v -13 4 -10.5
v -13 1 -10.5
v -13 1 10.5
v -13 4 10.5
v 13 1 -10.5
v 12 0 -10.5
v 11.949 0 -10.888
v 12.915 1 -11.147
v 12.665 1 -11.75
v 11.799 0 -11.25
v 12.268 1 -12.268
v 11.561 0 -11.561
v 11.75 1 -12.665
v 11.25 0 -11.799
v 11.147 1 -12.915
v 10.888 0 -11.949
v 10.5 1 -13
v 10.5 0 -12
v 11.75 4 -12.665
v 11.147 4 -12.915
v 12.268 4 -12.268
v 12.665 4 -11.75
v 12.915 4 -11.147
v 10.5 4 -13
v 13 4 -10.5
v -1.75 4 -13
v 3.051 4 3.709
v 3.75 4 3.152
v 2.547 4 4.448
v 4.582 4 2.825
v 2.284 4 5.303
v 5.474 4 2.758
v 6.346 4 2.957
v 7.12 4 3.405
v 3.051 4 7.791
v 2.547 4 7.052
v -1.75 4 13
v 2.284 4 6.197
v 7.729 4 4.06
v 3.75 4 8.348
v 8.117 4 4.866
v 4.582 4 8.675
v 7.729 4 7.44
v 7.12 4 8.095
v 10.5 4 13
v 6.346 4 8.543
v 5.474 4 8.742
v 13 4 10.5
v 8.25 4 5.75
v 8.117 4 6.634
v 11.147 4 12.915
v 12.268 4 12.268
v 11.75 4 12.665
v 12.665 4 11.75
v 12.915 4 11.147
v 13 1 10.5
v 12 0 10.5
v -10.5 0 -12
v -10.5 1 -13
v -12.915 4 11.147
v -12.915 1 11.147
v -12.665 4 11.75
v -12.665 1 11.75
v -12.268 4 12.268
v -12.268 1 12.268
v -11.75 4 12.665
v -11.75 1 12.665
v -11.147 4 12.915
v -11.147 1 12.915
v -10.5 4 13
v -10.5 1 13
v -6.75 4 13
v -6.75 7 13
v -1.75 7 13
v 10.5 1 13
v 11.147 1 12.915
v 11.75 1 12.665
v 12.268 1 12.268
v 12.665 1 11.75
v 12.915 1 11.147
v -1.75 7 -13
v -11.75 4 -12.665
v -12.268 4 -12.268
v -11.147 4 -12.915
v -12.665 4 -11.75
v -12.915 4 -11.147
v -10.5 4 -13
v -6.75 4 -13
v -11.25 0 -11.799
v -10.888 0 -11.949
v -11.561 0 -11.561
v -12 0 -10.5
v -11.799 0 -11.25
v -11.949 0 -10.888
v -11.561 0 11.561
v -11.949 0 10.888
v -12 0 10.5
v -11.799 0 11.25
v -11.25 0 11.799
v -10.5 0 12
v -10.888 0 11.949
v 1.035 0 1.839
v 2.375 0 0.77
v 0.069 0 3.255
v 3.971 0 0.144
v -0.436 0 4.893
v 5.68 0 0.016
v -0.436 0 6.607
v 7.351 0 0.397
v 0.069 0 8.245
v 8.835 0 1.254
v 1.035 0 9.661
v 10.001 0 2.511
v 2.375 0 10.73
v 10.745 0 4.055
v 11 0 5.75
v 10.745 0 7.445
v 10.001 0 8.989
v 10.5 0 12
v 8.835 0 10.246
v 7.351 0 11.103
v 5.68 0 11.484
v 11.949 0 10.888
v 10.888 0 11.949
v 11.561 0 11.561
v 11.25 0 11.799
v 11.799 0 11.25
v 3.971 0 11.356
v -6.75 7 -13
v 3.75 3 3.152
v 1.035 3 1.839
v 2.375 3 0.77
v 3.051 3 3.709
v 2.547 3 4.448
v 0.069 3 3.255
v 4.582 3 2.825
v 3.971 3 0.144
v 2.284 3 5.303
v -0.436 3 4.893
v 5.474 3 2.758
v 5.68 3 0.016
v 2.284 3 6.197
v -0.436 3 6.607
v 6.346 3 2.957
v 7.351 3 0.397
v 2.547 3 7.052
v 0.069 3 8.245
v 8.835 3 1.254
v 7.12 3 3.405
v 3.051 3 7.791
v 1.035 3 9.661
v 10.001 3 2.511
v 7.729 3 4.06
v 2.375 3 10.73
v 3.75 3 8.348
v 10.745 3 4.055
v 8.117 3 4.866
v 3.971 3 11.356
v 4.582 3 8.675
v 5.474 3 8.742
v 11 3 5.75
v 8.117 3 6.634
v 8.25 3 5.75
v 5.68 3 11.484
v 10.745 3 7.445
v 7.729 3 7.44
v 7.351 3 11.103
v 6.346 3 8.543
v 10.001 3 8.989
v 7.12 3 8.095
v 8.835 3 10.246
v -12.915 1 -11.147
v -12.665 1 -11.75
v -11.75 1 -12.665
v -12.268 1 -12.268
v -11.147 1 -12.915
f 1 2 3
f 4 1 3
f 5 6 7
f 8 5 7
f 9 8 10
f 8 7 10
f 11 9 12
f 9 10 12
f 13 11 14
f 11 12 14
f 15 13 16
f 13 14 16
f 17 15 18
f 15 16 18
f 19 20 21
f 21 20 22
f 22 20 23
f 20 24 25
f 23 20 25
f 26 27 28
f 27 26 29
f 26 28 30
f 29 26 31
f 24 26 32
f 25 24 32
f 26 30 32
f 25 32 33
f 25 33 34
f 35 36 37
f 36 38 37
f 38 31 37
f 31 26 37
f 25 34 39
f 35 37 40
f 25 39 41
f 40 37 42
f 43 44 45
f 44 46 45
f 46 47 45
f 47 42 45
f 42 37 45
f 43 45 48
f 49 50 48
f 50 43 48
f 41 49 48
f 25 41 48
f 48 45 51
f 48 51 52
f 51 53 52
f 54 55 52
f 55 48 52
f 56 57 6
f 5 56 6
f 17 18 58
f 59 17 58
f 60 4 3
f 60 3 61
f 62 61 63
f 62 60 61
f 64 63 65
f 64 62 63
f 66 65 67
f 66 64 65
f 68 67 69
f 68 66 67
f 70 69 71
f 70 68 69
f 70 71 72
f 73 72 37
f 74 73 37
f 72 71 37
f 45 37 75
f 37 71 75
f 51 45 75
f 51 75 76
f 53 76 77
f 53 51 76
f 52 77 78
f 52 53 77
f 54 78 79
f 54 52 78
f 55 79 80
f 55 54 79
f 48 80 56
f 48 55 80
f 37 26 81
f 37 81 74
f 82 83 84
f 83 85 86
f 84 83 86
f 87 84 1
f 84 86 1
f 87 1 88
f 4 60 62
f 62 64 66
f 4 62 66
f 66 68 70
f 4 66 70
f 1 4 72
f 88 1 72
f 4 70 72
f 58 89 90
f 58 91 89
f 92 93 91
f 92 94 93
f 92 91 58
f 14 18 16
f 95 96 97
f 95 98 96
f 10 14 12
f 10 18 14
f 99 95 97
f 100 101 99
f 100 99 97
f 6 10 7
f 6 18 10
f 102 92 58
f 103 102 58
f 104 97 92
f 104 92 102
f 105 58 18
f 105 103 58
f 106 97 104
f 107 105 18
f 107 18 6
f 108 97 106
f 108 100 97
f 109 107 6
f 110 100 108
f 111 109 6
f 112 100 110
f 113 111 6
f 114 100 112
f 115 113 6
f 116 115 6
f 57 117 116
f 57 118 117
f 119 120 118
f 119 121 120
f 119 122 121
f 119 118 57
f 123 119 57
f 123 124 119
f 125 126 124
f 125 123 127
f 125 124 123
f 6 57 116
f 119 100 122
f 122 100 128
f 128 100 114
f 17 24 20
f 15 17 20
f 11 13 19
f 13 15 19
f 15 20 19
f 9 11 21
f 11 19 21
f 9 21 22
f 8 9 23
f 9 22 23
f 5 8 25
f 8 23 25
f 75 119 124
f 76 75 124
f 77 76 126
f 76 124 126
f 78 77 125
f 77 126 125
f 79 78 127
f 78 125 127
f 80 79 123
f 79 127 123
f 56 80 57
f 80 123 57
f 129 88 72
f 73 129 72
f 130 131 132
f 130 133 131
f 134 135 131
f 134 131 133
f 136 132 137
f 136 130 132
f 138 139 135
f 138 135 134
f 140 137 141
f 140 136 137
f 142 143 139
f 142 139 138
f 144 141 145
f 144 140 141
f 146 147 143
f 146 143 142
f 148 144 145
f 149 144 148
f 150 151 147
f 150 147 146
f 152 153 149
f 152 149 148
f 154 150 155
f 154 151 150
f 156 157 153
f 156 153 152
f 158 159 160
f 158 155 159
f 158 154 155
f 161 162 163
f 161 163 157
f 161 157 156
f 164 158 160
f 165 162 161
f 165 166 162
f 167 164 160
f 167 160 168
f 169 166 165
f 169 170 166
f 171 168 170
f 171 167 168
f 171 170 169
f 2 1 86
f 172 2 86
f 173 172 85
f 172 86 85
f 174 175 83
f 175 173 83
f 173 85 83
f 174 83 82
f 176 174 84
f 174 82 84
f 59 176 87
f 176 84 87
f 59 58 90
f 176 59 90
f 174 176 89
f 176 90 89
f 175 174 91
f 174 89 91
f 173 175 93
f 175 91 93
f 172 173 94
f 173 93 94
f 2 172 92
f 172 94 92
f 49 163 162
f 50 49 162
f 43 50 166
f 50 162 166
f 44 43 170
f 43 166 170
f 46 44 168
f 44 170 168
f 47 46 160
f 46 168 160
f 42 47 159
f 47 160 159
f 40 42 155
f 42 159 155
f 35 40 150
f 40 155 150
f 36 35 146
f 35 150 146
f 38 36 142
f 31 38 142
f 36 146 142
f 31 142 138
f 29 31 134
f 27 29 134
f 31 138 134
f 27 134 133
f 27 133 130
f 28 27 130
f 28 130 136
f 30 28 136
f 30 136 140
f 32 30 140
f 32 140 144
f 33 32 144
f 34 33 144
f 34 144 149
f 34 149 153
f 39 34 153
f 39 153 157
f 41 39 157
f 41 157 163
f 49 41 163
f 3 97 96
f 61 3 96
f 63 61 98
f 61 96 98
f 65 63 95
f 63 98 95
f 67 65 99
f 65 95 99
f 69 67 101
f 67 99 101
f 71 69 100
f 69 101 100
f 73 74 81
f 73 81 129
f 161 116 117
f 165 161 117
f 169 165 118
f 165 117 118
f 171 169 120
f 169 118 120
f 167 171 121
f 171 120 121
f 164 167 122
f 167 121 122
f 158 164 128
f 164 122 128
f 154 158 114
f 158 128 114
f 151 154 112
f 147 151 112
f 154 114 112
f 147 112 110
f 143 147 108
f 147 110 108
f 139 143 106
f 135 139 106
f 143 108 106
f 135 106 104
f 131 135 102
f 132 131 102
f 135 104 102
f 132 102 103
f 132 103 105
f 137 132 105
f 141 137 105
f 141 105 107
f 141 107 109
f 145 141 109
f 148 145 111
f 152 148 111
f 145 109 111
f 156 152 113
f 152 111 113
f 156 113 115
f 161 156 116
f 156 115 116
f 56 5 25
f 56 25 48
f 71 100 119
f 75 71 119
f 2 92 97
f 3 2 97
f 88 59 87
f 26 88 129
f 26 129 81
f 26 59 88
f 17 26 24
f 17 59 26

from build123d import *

# Parameters (mm, degrees)
F0_W     = 26
F0_H     = 26
F1_DEPTH = 4
F2_W     = 5
F2_H     = 26
F3_DEPTH = 3
F4_R     = 2.5
F5_R     = 3
F6_DEPTH = 25
F7_R     = 5.75
F8_DEPTH = 3
F9_SIZE  = 1


with BuildPart() as f1:
    # F0 (on Front) → F1 (new body)
    with BuildSketch(Plane.XZ):
        Rectangle(F0_W, F0_H)
    extrude(amount=-F1_DEPTH)

    # F2 (on face) → F3 (join)
    with BuildSketch(Plane(origin=(0, 4, 0), x_dir=(-1, 0, 0), z_dir=(0, 1, 0))):
        with Locations((4.25, 0)):
            Rectangle(F2_W, F2_H)
    extrude(amount=F3_DEPTH)

    # F4
    f4_edges = [f1.edges().sort_by_distance(p)[0] for p in [
        (-13, 2, 13),
        (-13, 2, -13),
        (13, 2, 13),
        (13, 2, -13),
    ]]
    fillet(f4_edges, radius=F4_R)

    # F5 (on face) → F6 (cut)
    with BuildSketch(Plane.XZ):
        with Locations((5.25, 5.75)):
            Circle(F5_R)
    extrude(amount=-F6_DEPTH, mode=Mode.SUBTRACT)

    # F7 (on face) → F8 (cut)
    with BuildSketch(Plane.XZ):
        with Locations((5.25, 5.75)):
            Circle(F7_R)
    extrude(amount=-F8_DEPTH, mode=Mode.SUBTRACT)

    # F9
    f9_edges = [f1.edges().sort_by_distance(p)[0] for p in [
        (-13, 0, 0),
    ]]
    chamfer(f9_edges, length=F9_SIZE)


solid = f1.part
